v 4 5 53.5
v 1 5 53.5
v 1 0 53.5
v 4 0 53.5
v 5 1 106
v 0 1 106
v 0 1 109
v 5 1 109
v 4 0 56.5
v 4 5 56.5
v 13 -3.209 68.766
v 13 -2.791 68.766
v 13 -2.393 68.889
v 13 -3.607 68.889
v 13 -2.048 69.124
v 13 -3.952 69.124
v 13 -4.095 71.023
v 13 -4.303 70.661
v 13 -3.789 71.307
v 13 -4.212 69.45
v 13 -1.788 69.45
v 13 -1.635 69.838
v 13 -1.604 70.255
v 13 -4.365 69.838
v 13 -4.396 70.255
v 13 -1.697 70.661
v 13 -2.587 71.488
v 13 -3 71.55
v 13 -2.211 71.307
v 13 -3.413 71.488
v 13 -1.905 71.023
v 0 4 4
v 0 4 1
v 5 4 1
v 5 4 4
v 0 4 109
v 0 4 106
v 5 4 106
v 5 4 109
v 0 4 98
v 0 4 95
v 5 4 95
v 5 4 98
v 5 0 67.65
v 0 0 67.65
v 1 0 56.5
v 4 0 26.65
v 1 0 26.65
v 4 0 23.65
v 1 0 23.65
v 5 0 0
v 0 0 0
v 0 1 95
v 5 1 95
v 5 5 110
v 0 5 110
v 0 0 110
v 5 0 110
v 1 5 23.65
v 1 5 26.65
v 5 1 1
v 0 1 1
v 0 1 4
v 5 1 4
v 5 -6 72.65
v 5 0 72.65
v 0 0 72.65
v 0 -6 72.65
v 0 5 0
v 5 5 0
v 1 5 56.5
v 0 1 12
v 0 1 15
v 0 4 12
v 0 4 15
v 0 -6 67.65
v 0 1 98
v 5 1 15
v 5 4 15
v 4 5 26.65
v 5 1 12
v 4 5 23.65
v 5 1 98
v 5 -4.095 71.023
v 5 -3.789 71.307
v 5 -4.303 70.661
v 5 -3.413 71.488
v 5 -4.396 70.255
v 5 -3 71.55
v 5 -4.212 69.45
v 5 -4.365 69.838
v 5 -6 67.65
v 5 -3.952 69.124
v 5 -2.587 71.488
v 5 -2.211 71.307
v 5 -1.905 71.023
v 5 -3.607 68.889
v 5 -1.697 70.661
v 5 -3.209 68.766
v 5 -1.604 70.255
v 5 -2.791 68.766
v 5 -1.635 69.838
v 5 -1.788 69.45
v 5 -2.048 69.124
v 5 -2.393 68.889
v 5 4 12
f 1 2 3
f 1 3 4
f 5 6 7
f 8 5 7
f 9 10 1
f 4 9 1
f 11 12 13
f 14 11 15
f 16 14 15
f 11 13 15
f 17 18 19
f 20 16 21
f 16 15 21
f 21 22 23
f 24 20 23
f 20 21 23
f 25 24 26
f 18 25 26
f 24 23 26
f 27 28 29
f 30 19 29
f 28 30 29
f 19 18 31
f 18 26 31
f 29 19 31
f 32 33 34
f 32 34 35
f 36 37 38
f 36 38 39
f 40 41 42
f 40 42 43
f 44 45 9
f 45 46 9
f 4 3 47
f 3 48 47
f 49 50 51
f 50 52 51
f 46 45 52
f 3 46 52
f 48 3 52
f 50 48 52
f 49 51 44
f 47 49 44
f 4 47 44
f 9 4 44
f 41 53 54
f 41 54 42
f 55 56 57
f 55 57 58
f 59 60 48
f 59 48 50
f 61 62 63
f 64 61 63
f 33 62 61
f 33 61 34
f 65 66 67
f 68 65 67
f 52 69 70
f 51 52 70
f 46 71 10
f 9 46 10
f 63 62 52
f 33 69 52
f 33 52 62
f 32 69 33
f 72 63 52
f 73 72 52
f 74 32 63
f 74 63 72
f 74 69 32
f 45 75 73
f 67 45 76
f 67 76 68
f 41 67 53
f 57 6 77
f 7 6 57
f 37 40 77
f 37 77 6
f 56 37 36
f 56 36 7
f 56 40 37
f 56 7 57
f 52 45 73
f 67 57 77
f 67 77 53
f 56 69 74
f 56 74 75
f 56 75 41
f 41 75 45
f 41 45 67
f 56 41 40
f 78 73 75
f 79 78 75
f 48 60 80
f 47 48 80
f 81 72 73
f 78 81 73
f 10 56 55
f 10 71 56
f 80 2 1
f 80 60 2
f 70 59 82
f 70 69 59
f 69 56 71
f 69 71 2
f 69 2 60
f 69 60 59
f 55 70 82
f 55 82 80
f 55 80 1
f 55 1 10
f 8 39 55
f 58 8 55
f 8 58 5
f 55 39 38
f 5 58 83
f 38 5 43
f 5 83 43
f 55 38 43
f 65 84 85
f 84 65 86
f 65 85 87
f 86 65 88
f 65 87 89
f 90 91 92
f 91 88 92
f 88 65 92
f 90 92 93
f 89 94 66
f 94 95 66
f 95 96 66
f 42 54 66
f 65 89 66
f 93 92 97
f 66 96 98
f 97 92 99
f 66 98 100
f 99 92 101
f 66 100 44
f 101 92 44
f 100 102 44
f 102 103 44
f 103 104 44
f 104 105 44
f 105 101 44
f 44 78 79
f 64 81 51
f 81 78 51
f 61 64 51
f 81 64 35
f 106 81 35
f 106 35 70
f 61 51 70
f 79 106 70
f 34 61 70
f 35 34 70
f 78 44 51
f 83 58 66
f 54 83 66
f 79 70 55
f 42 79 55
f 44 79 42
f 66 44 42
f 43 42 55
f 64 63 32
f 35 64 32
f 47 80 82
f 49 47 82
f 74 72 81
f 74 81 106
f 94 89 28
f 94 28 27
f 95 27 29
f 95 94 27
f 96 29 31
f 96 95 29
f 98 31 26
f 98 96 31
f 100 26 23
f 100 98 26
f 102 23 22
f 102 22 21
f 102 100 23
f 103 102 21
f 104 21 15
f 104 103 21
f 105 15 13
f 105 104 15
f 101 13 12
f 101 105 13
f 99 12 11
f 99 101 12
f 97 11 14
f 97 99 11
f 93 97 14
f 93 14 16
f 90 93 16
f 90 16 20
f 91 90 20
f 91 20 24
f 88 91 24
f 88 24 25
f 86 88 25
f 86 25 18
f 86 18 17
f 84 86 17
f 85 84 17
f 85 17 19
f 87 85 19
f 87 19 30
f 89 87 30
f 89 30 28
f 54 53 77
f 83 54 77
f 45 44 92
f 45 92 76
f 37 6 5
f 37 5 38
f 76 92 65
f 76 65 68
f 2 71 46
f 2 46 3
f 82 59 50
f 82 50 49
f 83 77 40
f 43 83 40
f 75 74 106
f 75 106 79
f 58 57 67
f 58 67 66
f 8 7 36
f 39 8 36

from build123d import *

# Parameters (mm, degrees)
SKETCH1_W           = 5
SKETCH1_H           = 5
BOSS_EXTRUDE1_DEPTH = 110
SKETCH2_W           = 3
SKETCH2_H           = 3
CUT_EXTRUDE1_DEPTH  = 9
SKETCH3_W           = 3
SKETCH3_H           = 3
CUT_EXTRUDE2_DEPTH  = 9
SKETCH4_W           = 5
SKETCH4_H           = 5
BOSS_EXTRUDE2_DEPTH = 6
SKETCH5_R           = 1.4
BOSS_EXTRUDE3_DEPTH = 13


with BuildPart() as part:
    # Sketch1 → Boss-Extrude1 (new body)
    with BuildSketch(Plane.XY):
        with Locations((2.5, 2.5)):
            Rectangle(SKETCH1_W, SKETCH1_H)
    extrude(amount=BOSS_EXTRUDE1_DEPTH)

    # Sketch2 → Cut-Extrude1 (cut)
    with BuildSketch(Plane.ZY):
        with Locations((2.5, 2.5)):
            Rectangle(SKETCH2_W, SKETCH2_H)
        with Locations((107.5, 2.5)):
            Rectangle(SKETCH2_W, SKETCH2_H)
        with Locations((13.5, 2.5)):
            Rectangle(SKETCH2_W, SKETCH2_H)
        with Locations((96.5, 2.5)):
            Rectangle(SKETCH2_W, SKETCH2_H)
    extrude(amount=-CUT_EXTRUDE1_DEPTH, mode=Mode.SUBTRACT)

    # Sketch3 → Cut-Extrude2 (cut)
    with BuildSketch(Plane(origin=(0, 5, 0), x_dir=(1, 0, 0), z_dir=(0, 1, 0))):
        with Locations((2.5, -25.15)):
            Rectangle(SKETCH3_W, SKETCH3_H)
        with Locations((2.5, -55)):
            Rectangle(SKETCH3_W, SKETCH3_H)
    extrude(amount=-CUT_EXTRUDE2_DEPTH, mode=Mode.SUBTRACT)

    # Sketch4 → Boss-Extrude2 (add)
    with BuildSketch(Plane(origin=(0, 0, 0), x_dir=(-1, 0, 0), z_dir=(0, -1, 0))):
        with Locations((-2.5, -70.15)):
            Rectangle(SKETCH4_W, SKETCH4_H)
    extrude(amount=BOSS_EXTRUDE2_DEPTH)

    # Sketch5 → Boss-Extrude3 (add)
    with BuildSketch(Plane.ZY):
        with Locations((70.15, -3)):
            Circle(SKETCH5_R)
    extrude(amount=-BOSS_EXTRUDE3_DEPTH)


solid = part.part
